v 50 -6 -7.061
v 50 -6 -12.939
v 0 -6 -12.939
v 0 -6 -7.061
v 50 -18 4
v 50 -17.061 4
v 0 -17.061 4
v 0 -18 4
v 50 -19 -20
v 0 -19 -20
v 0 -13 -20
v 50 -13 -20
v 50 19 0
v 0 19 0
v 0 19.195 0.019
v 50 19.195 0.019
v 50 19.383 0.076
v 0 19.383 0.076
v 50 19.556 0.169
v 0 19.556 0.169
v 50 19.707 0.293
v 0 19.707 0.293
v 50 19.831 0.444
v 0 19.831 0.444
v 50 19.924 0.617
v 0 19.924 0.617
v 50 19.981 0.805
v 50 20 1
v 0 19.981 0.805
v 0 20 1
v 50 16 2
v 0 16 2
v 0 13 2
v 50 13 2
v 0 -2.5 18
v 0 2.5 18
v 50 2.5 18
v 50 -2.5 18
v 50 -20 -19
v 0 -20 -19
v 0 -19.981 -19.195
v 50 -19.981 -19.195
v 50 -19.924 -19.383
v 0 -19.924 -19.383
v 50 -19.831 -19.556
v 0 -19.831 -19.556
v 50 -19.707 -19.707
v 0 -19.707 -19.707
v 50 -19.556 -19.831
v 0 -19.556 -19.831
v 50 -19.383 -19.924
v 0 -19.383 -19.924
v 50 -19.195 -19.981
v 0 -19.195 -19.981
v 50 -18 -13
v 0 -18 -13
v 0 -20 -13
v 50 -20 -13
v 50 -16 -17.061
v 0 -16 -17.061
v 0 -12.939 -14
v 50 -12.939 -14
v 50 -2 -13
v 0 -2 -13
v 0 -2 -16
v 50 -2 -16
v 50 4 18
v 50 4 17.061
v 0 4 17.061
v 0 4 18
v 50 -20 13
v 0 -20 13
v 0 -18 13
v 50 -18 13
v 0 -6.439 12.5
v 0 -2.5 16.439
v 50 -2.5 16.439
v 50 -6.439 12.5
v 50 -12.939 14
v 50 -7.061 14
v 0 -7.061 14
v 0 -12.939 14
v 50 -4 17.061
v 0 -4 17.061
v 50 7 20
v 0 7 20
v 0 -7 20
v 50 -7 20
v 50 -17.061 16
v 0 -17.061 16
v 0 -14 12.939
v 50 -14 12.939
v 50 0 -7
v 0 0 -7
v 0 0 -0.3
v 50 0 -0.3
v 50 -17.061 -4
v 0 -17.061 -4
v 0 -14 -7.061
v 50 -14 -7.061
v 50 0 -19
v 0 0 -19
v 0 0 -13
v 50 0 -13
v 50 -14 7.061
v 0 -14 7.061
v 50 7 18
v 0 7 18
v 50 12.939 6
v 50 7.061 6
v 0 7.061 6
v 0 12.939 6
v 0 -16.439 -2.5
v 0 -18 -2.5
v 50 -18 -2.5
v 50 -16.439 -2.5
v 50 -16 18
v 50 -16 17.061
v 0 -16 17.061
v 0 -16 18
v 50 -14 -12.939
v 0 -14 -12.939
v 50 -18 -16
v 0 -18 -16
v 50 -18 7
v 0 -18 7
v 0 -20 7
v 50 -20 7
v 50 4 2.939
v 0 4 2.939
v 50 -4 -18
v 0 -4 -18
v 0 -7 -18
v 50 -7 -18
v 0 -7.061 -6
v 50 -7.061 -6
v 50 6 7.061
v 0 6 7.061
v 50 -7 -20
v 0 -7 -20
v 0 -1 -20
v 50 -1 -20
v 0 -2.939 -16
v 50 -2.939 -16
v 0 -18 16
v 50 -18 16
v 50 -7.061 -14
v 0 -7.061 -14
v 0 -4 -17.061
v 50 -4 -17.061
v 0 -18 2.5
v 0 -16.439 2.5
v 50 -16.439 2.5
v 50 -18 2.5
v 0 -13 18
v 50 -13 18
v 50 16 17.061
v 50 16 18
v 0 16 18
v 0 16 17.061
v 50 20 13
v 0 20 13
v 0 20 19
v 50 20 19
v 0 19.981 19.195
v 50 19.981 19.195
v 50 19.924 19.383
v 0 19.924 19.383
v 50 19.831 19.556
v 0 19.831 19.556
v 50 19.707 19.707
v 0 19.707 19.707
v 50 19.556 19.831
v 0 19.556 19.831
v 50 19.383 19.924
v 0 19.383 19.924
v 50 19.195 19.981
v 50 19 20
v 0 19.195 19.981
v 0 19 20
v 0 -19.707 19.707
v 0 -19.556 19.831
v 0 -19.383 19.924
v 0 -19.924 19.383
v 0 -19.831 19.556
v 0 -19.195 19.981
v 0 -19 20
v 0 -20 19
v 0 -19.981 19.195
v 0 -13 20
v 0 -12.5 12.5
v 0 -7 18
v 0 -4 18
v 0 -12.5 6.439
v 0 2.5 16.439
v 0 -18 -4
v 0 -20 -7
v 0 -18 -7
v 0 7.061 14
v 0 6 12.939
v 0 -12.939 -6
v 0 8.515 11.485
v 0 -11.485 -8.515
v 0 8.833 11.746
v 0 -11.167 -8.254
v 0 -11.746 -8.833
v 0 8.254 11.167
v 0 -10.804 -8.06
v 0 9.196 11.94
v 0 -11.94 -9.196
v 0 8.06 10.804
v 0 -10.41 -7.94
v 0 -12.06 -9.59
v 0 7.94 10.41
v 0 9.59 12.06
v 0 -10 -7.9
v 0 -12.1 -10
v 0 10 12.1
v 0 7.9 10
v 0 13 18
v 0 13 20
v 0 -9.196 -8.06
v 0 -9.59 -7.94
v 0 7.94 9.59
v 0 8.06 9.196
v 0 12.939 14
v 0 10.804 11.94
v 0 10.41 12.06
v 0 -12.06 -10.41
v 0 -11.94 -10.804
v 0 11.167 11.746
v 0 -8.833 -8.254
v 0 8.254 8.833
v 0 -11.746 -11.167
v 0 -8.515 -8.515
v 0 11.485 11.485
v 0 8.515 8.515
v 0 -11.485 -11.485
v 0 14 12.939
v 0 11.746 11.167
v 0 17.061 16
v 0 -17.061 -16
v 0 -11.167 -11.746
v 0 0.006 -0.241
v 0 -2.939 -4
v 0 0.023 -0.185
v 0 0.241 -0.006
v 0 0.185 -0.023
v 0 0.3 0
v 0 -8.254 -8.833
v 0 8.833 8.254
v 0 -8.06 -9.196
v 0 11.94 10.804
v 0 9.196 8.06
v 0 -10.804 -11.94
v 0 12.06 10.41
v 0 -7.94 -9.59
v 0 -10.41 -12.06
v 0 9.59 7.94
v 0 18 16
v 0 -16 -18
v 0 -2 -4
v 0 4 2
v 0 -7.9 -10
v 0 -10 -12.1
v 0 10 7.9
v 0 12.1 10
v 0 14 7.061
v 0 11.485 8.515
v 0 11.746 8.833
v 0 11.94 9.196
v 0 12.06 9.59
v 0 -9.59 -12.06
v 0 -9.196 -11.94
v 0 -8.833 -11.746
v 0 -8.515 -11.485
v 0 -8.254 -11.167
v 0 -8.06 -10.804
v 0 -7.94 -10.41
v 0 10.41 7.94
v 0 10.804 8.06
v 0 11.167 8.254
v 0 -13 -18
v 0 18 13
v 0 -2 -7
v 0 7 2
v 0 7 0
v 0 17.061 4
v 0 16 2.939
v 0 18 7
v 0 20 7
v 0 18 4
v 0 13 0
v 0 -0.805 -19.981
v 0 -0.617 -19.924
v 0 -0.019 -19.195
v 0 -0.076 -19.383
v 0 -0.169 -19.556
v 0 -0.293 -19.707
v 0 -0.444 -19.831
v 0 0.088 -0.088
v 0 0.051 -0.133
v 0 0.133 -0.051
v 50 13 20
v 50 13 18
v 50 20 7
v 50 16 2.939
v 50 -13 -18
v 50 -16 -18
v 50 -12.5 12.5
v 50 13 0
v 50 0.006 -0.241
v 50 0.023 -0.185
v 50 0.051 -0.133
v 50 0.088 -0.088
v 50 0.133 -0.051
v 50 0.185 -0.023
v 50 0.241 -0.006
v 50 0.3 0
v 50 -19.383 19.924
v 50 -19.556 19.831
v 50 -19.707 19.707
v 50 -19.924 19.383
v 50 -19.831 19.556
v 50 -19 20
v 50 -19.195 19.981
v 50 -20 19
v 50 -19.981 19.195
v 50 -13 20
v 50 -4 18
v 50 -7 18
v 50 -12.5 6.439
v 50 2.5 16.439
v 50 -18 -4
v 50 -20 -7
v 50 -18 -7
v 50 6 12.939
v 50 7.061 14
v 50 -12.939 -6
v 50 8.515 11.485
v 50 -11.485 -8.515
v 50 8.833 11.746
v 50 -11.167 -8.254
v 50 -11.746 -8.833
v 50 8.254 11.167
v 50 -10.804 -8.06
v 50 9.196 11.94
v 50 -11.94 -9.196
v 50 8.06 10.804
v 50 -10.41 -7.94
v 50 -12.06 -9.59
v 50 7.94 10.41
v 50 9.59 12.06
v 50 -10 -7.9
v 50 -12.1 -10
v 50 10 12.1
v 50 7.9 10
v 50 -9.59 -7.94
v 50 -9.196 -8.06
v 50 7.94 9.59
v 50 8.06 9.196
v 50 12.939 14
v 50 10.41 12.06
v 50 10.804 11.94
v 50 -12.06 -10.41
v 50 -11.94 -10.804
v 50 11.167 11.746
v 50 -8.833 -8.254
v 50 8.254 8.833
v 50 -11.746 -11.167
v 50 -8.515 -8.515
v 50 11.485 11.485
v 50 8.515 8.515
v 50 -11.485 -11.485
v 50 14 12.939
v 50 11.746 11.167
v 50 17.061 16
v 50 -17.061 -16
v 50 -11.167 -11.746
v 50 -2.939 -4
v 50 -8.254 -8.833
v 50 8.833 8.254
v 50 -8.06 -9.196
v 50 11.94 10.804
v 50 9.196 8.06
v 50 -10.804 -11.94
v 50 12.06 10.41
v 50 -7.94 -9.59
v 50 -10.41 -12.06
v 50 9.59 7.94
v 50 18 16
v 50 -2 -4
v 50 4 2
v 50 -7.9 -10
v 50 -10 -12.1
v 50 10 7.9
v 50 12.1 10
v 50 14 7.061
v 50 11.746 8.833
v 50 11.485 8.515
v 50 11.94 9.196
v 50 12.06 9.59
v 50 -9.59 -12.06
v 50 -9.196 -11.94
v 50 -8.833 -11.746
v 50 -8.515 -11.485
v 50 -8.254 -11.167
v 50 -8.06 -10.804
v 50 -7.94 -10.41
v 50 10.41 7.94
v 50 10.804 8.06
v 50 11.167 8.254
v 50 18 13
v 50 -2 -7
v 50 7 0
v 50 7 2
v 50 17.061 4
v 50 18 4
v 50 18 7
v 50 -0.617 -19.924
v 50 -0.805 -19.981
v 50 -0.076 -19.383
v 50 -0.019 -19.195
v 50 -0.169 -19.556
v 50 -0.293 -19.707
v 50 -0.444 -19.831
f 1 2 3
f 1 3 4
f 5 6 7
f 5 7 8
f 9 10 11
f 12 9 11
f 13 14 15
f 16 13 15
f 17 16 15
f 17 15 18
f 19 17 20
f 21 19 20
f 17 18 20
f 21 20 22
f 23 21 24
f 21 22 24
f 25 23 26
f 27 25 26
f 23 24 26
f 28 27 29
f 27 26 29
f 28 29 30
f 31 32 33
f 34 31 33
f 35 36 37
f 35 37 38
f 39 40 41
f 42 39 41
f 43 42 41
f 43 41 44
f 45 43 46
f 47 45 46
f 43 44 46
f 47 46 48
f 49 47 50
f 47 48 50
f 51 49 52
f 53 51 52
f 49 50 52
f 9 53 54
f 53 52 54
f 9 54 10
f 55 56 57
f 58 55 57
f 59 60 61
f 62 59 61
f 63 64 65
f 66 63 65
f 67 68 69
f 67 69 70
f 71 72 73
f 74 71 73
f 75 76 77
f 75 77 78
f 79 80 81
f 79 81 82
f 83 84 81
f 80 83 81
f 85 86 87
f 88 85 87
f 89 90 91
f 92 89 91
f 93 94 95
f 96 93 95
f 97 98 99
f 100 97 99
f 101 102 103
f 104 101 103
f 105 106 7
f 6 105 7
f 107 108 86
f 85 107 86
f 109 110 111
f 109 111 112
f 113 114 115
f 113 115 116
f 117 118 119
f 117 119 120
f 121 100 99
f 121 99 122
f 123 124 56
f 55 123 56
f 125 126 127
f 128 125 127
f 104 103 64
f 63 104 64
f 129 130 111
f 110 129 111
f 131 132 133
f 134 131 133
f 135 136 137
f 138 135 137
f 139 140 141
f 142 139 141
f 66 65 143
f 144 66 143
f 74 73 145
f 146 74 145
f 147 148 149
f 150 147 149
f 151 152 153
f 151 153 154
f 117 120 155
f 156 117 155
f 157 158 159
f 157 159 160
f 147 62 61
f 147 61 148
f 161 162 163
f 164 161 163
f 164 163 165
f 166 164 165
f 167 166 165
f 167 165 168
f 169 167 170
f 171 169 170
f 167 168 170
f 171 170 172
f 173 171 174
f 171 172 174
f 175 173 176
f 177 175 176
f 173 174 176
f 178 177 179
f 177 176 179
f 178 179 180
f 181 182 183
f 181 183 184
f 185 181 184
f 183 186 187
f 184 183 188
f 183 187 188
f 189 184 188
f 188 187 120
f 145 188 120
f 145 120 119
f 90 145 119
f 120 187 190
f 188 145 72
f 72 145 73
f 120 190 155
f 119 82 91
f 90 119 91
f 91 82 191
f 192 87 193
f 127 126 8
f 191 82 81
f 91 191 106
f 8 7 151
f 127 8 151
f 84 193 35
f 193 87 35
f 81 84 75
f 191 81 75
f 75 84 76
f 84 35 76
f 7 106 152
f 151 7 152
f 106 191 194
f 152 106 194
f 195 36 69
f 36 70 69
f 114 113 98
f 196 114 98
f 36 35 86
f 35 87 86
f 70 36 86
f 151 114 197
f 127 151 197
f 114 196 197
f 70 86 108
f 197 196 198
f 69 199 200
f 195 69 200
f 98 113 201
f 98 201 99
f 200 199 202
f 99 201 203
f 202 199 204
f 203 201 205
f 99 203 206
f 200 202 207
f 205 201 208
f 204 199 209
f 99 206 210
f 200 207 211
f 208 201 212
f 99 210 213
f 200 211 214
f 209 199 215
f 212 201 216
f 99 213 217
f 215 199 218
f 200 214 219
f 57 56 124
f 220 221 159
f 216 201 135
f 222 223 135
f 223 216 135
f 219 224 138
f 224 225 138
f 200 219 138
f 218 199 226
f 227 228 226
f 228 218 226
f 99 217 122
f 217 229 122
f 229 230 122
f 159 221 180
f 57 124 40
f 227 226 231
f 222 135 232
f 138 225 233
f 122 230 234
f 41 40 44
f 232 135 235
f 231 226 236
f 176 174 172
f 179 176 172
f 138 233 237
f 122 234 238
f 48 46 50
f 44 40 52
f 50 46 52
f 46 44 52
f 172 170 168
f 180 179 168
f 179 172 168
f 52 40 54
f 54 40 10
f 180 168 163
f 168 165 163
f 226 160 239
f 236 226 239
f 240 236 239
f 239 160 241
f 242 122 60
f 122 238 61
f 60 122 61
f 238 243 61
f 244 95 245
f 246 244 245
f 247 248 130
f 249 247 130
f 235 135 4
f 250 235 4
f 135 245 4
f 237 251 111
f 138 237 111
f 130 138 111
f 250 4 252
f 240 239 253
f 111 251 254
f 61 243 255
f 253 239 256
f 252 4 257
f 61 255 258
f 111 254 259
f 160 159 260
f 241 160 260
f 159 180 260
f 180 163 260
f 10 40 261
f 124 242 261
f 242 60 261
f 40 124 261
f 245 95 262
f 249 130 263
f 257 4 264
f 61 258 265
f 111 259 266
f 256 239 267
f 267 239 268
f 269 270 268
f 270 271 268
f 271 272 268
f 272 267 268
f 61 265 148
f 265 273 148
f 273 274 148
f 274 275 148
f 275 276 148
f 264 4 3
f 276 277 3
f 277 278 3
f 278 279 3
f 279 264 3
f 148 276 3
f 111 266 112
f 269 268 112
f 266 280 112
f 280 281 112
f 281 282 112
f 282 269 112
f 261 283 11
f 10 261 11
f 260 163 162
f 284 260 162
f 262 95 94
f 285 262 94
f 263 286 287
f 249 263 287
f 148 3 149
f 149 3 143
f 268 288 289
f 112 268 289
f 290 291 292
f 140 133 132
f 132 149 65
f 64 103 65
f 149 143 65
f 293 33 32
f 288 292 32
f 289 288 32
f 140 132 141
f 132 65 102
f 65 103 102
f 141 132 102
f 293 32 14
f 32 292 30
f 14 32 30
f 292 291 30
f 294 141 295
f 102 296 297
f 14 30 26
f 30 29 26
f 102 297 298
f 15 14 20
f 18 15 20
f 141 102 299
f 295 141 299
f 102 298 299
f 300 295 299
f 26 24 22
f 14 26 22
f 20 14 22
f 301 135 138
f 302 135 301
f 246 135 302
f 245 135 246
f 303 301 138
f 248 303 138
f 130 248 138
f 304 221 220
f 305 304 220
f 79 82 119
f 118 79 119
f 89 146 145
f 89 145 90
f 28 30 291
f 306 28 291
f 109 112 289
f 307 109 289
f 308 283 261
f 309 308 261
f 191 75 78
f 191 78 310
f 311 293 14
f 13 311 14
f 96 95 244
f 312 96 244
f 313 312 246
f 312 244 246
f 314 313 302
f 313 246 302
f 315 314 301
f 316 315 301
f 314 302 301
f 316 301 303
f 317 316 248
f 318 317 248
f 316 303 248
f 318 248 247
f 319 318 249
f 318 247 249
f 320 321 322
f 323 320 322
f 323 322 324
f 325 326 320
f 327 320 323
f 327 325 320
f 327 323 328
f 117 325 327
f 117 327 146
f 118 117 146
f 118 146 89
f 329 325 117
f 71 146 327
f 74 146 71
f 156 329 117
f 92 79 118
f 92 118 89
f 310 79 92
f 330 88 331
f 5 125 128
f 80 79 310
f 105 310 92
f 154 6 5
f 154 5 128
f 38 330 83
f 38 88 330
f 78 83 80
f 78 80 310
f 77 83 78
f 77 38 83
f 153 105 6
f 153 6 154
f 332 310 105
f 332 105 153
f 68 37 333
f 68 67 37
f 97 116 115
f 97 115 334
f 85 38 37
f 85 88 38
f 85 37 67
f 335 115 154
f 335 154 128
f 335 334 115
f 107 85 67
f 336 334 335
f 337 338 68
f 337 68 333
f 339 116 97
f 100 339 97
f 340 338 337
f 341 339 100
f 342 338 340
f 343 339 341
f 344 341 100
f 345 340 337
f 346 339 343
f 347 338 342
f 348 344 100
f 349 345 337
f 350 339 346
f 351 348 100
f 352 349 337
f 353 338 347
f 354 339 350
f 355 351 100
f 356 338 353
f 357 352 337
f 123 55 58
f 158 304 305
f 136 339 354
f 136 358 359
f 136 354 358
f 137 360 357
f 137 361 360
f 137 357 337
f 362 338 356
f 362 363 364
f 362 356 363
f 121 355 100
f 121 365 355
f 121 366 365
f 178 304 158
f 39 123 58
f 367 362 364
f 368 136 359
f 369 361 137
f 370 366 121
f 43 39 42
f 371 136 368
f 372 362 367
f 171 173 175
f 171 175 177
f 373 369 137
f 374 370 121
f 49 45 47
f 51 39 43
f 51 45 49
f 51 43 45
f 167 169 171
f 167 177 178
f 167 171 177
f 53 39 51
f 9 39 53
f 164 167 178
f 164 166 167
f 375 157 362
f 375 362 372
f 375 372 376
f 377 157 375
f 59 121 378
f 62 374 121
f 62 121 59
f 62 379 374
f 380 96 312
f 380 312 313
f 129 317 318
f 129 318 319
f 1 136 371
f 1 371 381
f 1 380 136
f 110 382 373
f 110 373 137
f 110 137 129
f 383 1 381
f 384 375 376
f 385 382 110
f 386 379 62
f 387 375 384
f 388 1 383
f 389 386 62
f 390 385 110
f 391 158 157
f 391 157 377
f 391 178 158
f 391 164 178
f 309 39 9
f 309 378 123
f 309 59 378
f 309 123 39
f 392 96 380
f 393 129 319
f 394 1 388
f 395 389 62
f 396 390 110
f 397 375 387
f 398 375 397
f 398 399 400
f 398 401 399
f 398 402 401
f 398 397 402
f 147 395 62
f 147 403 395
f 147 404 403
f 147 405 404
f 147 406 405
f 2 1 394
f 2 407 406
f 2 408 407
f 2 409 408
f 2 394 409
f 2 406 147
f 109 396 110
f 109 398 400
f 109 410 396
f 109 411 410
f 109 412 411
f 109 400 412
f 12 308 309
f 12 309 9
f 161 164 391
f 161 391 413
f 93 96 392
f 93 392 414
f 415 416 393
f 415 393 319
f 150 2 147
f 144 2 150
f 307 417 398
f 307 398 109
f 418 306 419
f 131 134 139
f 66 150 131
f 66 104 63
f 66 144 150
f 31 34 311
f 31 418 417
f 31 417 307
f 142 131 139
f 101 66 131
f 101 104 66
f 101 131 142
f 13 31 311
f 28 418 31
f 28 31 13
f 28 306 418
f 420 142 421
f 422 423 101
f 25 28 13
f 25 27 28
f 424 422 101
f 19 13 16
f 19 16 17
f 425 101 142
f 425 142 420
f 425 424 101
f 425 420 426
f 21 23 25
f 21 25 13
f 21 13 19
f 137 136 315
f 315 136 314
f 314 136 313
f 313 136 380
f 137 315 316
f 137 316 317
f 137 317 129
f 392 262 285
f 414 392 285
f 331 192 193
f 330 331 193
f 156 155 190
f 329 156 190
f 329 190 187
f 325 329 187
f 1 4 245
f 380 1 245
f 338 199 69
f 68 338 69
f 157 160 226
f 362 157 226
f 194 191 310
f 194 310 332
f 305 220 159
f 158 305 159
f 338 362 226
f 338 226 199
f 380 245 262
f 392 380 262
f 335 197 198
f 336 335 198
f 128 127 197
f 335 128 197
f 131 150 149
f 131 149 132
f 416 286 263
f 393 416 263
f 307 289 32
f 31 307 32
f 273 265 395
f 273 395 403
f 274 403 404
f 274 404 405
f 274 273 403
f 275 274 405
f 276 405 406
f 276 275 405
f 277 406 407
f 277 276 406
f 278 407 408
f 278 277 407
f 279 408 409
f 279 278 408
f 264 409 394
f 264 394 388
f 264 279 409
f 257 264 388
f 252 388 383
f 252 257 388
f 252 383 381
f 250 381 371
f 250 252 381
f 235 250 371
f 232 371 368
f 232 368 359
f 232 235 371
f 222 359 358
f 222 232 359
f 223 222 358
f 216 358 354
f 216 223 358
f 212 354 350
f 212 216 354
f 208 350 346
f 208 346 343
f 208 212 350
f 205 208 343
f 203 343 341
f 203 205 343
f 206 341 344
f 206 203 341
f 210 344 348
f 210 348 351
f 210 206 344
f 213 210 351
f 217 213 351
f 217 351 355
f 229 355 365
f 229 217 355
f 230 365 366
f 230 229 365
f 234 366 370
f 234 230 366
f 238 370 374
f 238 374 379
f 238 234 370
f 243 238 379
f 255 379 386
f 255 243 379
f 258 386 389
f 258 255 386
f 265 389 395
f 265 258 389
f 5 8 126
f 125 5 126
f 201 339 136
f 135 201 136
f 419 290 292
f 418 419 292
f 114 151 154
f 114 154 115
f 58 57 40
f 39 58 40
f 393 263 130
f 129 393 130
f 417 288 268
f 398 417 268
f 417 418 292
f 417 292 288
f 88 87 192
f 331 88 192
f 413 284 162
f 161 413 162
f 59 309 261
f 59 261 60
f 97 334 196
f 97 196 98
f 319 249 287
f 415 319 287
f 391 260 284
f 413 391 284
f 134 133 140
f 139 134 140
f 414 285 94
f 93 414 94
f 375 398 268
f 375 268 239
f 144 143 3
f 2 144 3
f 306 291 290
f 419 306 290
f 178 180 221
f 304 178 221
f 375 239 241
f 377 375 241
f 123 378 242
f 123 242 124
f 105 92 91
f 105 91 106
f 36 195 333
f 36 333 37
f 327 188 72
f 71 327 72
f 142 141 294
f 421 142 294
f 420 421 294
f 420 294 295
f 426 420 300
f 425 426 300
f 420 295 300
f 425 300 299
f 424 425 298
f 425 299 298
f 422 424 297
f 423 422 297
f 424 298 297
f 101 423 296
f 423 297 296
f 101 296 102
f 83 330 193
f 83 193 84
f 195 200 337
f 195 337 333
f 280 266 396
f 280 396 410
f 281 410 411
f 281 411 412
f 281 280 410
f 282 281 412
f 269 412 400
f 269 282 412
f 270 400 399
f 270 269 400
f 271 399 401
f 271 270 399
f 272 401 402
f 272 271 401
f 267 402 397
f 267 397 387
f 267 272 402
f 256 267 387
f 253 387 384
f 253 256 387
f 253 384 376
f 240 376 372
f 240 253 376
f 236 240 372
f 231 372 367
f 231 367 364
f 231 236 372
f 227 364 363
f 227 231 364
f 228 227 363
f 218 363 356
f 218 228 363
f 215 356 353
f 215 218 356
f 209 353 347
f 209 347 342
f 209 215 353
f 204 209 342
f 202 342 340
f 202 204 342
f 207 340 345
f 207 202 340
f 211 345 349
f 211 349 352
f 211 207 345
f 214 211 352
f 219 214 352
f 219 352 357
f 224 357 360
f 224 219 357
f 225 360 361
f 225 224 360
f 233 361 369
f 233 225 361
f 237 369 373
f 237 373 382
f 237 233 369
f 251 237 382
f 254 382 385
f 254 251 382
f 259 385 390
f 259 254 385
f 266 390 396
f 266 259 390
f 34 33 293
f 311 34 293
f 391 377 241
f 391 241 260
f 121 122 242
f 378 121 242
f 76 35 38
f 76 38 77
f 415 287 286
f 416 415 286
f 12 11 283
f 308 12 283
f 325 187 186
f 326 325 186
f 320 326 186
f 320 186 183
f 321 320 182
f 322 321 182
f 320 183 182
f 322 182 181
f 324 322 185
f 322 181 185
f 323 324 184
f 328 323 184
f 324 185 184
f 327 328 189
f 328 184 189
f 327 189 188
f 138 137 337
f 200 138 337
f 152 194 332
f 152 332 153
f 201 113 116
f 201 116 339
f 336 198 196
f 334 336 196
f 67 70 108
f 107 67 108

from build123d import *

# Parameters (mm, degrees)
SKETCH1_R           = 2.1
BOSS_EXTRUDE1_DEPTH = 50


with BuildPart() as part:
    # Sketch1 → Boss-Extrude1 (new body)
    with BuildSketch(Plane(origin=(0, 0, 0), x_dir=(0, 0, -1), z_dir=(1, 0, 0))):
        with BuildLine():
            Line((-13, 18), (-13, 20))
            Line((-13, 20), (-19, 20))
            ThreePointArc((-19, 20), (-19.707106781, 19.707106781), (-20, 19))
            Line((-20, 19), (-20, 13))
            Line((-20, 13), (-18, 13))
            Line((-18, 13), (-18, 16))
            Line((-18, 16), (-17.060660172, 16))
            Line((-17.060660172, 16), (-14, 12.939339828))
            Line((-14, 12.939339828), (-14, 7.060660172))
            Line((-14, 7.060660172), (-17.060660172, 4))
            Line((-17.060660172, 4), (-18, 4))
            Line((-18, 4), (-18, 7))
            Line((-18, 7), (-20, 7))
            Line((-20, 7), (-20, -7))
            Line((-20, -7), (-18, -7))
            Line((-18, -7), (-18, -4))
            Line((-18, -4), (-17.060660172, -4))
            Line((-17.060660172, -4), (-14, -7.060660172))
            Line((-14, -7.060660172), (-14, -12.939339828))
            Line((-14, -12.939339828), (-17.060660172, -16))
            Line((-17.060660172, -16), (-18, -16))
            Line((-18, -16), (-18, -13))
            Line((-18, -13), (-20, -13))
            Line((-20, -13), (-20, -19))
            ThreePointArc((-20, -19), (-19.707106781, -19.707106781), (-19, -20))
            Line((-19, -20), (-13, -20))
            Line((-13, -20), (-13, -18))
            Line((-13, -18), (-16, -18))
            Line((-16, -18), (-16, -17.060660172))
            Line((-16, -17.060660172), (-12.939339828, -14))
            Line((-12.939339828, -14), (-7.060660172, -14))
            Line((-7.060660172, -14), (-4, -17.060660172))
            Line((-4, -17.060660172), (-4, -18))
            Line((-4, -18), (-7, -18))
            Line((-7, -18), (-7, -20))
            Line((-7, -20), (7, -20))
            Line((7, -20), (7, -18))
            Line((7, -18), (4, -18))
            Line((4, -18), (4, -17.060660172))
            Line((4, -17.060660172), (7.060660172, -14))
            Line((7.060660172, -14), (12.939339828, -14))
            Line((12.939339828, -14), (16, -17.060660172))
            Line((16, -17.060660172), (16, -18))
            Line((16, -18), (13, -18))
            Line((13, -18), (13, -20))
            Line((13, -20), (19, -20))
            ThreePointArc((19, -20), (19.707106781, -19.707106781), (20, -19))
            Line((20, -19), (20, -13))
            Line((20, -13), (18, -13))
            Line((18, -13), (18, -16))
            Line((18, -16), (17.060660172, -16))
            Line((17.060660172, -16), (14, -12.939339828))
            Line((14, -12.939339828), (14, -7.060660172))
            Line((14, -7.060660172), (17.060660172, -4))
            Line((17.060660172, -4), (18, -4))
            Line((18, -4), (18, -7))
            Line((18, -7), (20, -7))
            Line((20, -7), (20, -1))
            ThreePointArc((20, -1), (19.707106781, -0.292893219), (19, 0))
            Line((19, 0), (13, 0))
            Line((13, 0), (13, -2))
            Line((13, -2), (16, -2))
            Line((16, -2), (16, -2.939339828))
            Line((16, -2.939339828), (12.939339828, -6))
            Line((12.939339828, -6), (7.060660172, -6))
            Line((7.060660172, -6), (4, -2.939339828))
            Line((4, -2.939339828), (4, -2))
            Line((4, -2), (7, -2))
            Line((7, -2), (7, 0))
            Line((7, 0), (0.3, 0))
            ThreePointArc((0.3, 0), (0.087867966, 0.087867966), (0, 0.3))
            Line((0, 0.3), (0, 7))
            Line((0, 7), (-2, 7))
            Line((-2, 7), (-2, 4))
            Line((-2, 4), (-2.939339828, 4))
            Line((-2.939339828, 4), (-6, 7.060660172))
            Line((-6, 7.060660172), (-6, 12.939339828))
            Line((-6, 12.939339828), (-2.939339828, 16))
            Line((-2.939339828, 16), (-2, 16))
            Line((-2, 16), (-2, 13))
            Line((-2, 13), (0, 13))
            Line((0, 13), (0, 19))
            ThreePointArc((0, 19), (-0.292893219, 19.707106781), (-1, 20))
            Line((-1, 20), (-7, 20))
            Line((-7, 20), (-7, 18))
            Line((-7, 18), (-4, 18))
            Line((-4, 18), (-4, 17.060660172))
            Line((-4, 17.060660172), (-7.060660172, 14))
            Line((-7.060660172, 14), (-12.939339828, 14))
            Line((-12.939339828, 14), (-16, 17.060660172))
            Line((-16, 17.060660172), (-16, 18))
            Line((-16, 18), (-13, 18))
        make_face()
        with Locations((10, -10)):
            Circle(SKETCH1_R, mode=Mode.SUBTRACT)
        with Locations((-10, 10)):
            Circle(SKETCH1_R, mode=Mode.SUBTRACT)
        Polygon((6, -7.060660172), (-7.060660172, 6), (-12.939339828, 6), (-16.439339828, 2.5), (-18, 2.5), (-18, -2.5), (-16.439339828, -2.5), (-12.5, -6.439339828), (-12.5, -12.5), (-6.439339828, -12.5), (-2.5, -16.439339828), (-2.5, -18), (2.5, -18), (2.5, -16.439339828), (6, -12.939339828), align=None, mode=Mode.SUBTRACT)
    extrude(amount=BOSS_EXTRUDE1_DEPTH)


solid = part.part
